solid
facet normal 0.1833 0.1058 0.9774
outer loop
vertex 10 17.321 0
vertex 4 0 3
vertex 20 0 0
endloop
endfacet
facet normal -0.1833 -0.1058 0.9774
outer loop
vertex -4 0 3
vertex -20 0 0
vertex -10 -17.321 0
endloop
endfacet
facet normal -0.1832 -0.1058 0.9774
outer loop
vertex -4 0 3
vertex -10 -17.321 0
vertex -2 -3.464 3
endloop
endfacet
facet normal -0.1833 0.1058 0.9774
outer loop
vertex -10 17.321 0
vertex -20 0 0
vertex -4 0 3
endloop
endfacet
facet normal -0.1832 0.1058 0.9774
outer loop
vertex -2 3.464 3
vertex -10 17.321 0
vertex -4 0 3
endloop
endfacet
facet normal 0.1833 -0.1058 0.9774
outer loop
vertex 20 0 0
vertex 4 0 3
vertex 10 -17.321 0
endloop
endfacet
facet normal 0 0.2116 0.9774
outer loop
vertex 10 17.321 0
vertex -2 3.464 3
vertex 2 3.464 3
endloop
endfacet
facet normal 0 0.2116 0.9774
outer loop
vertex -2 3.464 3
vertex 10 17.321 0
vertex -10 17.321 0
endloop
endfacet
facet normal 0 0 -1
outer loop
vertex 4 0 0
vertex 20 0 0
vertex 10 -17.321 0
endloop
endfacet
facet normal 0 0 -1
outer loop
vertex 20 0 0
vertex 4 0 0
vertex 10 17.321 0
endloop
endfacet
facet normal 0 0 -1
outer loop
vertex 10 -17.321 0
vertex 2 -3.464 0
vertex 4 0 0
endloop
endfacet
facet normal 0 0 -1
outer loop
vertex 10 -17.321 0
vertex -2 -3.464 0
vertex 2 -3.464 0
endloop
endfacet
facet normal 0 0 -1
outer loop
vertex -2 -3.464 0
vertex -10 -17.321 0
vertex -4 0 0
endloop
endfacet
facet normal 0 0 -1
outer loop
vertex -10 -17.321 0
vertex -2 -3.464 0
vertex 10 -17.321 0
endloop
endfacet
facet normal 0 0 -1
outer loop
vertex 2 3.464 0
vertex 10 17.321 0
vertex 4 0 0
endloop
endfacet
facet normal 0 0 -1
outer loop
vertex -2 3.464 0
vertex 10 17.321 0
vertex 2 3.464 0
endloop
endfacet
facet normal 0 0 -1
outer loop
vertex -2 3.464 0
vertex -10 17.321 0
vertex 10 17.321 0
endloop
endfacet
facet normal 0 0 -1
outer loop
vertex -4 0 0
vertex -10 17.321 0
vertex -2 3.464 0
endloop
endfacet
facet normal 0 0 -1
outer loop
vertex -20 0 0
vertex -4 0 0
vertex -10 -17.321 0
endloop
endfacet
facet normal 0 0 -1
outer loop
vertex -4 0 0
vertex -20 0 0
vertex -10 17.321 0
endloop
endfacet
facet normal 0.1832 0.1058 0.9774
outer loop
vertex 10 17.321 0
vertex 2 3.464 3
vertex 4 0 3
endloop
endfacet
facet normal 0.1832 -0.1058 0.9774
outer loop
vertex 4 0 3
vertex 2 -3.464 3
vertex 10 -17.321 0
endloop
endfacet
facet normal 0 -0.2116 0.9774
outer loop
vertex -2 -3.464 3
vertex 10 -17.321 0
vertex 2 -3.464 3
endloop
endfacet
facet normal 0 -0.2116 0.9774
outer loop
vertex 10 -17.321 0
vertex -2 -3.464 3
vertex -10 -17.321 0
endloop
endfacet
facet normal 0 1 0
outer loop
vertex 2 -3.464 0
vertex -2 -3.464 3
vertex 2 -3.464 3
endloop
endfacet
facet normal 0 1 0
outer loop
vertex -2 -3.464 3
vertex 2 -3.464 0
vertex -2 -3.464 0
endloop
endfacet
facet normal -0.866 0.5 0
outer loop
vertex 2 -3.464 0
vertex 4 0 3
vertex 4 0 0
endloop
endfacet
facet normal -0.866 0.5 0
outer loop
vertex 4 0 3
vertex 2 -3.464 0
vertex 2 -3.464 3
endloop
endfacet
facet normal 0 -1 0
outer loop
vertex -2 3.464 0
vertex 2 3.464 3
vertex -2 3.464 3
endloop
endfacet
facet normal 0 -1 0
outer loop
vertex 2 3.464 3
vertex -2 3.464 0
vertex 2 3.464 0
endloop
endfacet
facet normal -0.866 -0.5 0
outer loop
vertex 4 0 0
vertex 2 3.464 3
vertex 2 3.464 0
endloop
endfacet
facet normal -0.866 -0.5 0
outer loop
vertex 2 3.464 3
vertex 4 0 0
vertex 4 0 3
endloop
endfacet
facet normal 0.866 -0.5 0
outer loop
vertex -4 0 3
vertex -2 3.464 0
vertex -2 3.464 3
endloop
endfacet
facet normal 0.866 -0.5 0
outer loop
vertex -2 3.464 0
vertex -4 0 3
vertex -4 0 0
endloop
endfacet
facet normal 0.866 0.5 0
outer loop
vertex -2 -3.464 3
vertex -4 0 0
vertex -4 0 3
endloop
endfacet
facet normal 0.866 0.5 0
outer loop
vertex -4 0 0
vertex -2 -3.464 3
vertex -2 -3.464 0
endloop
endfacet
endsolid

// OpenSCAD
difference() {
	cylinder(r1=20, r2=4, h=3, $fn=6);
	cylinder(r=4, h=3, $fn=6);
}
